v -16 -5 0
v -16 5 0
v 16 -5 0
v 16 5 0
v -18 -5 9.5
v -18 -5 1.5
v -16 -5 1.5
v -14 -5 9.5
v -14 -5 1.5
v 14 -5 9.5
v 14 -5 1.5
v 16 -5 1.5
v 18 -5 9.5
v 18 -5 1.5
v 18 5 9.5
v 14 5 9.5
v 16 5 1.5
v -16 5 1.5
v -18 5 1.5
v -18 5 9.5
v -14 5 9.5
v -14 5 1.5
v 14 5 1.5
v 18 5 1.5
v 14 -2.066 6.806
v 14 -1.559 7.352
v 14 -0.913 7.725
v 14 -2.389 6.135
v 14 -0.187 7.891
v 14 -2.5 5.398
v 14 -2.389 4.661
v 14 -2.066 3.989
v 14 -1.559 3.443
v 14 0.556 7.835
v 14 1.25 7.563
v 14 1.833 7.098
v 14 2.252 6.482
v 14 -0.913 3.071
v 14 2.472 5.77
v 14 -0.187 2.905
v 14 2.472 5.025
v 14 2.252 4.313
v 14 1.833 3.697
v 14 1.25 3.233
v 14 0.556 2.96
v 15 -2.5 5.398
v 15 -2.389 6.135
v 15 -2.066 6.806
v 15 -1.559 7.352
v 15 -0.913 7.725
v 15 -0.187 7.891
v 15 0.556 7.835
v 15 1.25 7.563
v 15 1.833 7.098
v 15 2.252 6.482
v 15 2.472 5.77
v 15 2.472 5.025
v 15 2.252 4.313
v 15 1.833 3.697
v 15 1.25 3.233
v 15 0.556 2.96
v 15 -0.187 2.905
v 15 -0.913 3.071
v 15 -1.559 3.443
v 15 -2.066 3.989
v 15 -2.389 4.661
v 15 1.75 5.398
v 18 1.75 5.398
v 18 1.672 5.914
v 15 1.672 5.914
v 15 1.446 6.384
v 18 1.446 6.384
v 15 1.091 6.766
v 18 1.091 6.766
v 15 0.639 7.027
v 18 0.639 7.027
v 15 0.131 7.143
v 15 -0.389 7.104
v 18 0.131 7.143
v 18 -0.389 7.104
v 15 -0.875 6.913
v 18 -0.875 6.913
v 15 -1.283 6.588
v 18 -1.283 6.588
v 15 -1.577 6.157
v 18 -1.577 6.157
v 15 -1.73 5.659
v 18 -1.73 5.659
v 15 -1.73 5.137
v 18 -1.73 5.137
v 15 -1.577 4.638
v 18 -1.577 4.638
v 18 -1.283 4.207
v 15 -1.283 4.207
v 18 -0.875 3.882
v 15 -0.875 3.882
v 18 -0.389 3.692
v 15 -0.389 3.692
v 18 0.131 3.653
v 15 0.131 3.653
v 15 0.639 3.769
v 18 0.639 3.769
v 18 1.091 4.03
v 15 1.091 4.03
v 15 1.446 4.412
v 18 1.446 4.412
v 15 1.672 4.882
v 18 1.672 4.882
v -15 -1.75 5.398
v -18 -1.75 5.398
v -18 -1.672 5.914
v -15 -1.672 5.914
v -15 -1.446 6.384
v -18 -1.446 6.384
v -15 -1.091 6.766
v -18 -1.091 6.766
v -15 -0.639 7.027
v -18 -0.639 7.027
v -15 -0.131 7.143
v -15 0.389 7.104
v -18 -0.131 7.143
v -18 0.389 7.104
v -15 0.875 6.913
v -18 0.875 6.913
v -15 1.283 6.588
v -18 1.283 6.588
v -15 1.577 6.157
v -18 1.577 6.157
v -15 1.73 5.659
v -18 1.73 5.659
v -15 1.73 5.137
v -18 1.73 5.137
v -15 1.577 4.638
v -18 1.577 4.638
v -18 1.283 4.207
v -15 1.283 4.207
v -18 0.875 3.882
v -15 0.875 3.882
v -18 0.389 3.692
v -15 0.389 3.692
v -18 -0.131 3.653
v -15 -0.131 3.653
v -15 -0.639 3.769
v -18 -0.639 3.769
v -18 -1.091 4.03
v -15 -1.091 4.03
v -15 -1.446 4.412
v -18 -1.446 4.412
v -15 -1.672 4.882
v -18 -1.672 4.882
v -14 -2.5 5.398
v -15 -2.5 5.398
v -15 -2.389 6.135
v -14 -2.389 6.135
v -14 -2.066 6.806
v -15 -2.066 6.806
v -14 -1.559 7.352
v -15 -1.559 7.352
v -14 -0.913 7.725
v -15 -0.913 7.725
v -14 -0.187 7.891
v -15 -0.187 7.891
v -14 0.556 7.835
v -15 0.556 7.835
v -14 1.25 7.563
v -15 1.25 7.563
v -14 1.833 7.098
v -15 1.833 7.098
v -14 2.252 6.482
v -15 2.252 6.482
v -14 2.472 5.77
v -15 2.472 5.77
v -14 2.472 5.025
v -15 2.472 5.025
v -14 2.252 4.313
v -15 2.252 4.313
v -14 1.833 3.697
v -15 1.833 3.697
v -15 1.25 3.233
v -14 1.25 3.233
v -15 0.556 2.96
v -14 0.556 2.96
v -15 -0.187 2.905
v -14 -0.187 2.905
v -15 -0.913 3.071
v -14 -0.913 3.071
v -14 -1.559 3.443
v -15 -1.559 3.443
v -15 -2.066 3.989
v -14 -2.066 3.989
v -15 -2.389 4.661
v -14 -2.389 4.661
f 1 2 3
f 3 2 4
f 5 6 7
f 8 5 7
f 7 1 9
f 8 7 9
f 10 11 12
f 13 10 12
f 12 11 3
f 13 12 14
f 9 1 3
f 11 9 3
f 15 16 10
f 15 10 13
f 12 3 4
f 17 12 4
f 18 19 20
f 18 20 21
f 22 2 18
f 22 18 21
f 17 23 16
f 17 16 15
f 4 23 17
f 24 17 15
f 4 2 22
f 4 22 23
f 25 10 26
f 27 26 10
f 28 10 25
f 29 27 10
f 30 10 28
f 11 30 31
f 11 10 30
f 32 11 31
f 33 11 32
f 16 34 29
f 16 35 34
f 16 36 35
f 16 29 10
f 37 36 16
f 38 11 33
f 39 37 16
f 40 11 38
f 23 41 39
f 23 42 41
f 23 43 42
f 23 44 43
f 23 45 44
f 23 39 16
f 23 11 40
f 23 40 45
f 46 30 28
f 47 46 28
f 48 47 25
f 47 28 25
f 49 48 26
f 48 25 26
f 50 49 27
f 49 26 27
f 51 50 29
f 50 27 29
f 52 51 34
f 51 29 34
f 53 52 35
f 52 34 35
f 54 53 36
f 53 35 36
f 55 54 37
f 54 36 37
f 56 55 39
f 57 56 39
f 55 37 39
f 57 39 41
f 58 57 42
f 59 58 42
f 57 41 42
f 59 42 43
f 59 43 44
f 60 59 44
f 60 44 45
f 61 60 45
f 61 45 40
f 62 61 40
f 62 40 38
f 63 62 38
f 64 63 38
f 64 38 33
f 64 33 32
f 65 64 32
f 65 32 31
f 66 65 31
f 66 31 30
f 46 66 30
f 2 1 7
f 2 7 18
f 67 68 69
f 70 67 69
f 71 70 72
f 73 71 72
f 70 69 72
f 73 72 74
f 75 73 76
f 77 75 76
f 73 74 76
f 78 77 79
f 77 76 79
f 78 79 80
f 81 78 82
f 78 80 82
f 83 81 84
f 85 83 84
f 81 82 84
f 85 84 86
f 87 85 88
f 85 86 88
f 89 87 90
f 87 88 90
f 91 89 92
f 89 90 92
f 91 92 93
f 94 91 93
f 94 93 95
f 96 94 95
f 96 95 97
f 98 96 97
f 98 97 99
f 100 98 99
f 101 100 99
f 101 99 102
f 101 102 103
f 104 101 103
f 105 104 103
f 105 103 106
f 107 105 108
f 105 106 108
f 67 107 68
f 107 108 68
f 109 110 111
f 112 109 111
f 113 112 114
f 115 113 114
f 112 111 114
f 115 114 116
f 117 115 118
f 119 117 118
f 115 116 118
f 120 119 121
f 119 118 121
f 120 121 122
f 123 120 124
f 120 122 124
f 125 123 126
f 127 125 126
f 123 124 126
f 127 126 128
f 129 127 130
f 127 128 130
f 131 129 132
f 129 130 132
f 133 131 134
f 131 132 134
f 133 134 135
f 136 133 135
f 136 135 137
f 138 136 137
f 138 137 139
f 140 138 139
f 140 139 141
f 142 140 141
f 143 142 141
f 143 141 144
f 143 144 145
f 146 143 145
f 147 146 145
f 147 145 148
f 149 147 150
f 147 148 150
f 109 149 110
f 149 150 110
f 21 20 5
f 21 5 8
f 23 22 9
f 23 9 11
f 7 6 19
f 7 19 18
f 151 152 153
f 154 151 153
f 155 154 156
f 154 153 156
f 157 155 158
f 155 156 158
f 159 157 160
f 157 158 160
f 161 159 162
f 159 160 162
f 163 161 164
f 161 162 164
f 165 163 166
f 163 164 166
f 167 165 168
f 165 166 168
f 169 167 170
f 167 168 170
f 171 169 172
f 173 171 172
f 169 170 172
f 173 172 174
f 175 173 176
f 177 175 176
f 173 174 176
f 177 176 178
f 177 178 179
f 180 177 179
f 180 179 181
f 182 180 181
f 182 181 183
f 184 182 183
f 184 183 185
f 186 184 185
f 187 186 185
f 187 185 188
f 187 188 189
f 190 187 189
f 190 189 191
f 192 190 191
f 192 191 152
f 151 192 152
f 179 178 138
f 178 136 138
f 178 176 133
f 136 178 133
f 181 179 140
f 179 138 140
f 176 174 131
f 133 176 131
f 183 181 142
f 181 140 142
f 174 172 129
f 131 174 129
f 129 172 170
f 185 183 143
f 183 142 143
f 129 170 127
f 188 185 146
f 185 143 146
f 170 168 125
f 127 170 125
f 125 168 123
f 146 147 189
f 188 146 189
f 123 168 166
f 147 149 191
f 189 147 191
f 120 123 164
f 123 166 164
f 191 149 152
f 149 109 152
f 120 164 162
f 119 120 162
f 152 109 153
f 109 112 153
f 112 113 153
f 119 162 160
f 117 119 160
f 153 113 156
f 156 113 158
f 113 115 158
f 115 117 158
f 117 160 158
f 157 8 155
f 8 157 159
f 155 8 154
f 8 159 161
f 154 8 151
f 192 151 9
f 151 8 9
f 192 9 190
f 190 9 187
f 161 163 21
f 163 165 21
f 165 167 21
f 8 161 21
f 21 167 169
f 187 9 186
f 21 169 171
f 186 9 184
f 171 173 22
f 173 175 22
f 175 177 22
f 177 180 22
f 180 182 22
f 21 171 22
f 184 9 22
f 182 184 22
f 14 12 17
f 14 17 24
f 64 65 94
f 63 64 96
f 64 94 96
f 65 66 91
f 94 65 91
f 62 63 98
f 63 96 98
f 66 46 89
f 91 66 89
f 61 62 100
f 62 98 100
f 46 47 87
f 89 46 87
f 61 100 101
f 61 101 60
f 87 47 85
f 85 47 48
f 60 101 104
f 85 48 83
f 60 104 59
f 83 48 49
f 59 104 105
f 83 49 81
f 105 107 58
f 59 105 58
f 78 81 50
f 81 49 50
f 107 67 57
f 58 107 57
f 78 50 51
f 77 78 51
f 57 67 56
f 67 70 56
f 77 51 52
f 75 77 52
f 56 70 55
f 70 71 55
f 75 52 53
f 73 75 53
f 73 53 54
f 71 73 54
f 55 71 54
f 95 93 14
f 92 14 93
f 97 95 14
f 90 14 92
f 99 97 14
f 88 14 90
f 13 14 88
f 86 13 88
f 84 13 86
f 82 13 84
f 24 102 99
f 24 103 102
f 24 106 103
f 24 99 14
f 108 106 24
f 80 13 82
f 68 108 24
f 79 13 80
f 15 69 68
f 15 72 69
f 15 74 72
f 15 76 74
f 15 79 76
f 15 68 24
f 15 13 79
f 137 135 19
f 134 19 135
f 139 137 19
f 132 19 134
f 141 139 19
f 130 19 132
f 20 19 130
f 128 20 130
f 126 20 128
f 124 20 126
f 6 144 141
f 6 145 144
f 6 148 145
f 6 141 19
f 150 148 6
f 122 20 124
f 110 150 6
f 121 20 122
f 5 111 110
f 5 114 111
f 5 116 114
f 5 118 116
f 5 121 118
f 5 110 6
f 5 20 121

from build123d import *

# Parameters (mm, degrees)
F0_W     = 32
F0_H     = 10
F1_DEPTH = 1.5
F2_W     = 4
F2_H     = 10
F3_DEPTH = 8
F4_R     = 2.5
F5_DEPTH = 50
F6_R     = 2.5
F6_R_2   = 1.75
F7_DEPTH = 3
F8_R     = 2.5
F8_R_2   = 1.75
F9_DEPTH = 3


with BuildPart() as f1:
    # F0 (on Top) → F1 (new body)
    with BuildSketch(Plane.XY):
        Rectangle(F0_W, F0_H)
    extrude(amount=F1_DEPTH)

    # F2 (on face) → F3 (join)
    with BuildSketch(Plane.XY.offset(1.5)):
        with Locations((-16, 0)):
            Rectangle(F2_W, F2_H)
        with Locations((16, 0)):
            Rectangle(F2_W, F2_H)
    extrude(amount=F3_DEPTH)

    # F4 (on face) → F5 (cut)
    with BuildSketch(Plane(origin=(-18, 0, 0), x_dir=(0, -1, 0), z_dir=(-1, 0, 0))):
        with Locations((0, 5.397753)):
            Circle(F4_R)
    extrude(amount=-F5_DEPTH, mode=Mode.SUBTRACT)

    # F6 (on face) → F7 (join)
    with BuildSketch(Plane(origin=(-18, 0, 0), x_dir=(0, -1, 0), z_dir=(-1, 0, 0))):
        with Locations((0, 5.397753)):
            Circle(F6_R)
        with Locations((0, 5.397753)):
            Circle(F6_R_2, mode=Mode.SUBTRACT)
    extrude(amount=-F7_DEPTH)

    # F8 (on face) → F9 (join)
    with BuildSketch(Plane.YZ.offset(18)):
        with Locations((0, 5.397753)):
            Circle(F8_R)
        with Locations((0, 5.397753)):
            Circle(F8_R_2, mode=Mode.SUBTRACT)
    extrude(amount=-F9_DEPTH)


solid = f1.part
